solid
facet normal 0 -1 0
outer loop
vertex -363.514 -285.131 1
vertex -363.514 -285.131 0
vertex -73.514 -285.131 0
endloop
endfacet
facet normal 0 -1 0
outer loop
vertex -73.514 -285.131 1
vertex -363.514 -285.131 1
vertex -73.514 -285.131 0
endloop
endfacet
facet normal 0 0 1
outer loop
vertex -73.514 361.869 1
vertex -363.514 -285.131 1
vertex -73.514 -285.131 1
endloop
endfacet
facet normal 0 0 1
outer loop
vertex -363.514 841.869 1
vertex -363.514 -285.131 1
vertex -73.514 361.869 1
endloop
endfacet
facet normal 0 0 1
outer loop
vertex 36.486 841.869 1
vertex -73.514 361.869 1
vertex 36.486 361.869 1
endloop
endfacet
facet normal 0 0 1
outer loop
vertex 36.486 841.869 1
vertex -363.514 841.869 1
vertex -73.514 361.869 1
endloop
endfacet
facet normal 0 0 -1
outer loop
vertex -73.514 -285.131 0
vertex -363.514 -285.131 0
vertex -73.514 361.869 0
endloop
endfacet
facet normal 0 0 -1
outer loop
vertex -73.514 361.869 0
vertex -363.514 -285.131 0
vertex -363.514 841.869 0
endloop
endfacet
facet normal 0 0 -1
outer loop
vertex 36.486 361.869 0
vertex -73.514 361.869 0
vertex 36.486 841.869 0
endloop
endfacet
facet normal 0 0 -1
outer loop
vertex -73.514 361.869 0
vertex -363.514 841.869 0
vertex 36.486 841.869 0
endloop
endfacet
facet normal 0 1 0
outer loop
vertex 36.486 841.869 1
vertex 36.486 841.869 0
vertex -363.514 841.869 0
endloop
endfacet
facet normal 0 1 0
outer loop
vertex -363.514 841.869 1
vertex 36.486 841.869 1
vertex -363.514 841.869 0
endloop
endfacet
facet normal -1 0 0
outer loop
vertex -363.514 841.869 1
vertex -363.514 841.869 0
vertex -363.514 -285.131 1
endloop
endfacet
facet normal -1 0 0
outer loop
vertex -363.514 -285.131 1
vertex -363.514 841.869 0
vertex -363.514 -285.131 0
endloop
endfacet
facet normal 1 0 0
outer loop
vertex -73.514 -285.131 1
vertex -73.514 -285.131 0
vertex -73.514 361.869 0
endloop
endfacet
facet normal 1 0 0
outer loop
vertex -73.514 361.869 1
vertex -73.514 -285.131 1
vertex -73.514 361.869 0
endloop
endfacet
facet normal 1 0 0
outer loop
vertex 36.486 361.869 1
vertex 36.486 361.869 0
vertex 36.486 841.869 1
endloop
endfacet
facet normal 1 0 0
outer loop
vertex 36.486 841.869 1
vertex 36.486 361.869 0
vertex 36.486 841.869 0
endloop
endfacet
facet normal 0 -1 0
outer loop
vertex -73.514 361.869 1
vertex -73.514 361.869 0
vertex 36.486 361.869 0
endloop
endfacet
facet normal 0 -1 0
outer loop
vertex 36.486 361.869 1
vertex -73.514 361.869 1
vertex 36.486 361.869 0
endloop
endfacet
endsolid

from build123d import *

# Parameters (mm, degrees)
F0_W     = 170
F0_H     = 220
F0_H_2   = 82
F1_DEPTH = 1


with BuildPart() as f1:
    # F0 (on Top) → F1 (new body)
    with BuildSketch(Plane.XY):
        Polygon((36.485837, 841.869394), (-363.514163, 841.869394), (-363.514163, 361.869394), (-193.514163, 361.869394), (-73.514163, 361.869394), (36.485837, 361.869394), align=None)
        with Locations((-278.514163, 251.869394)):
            Rectangle(F0_W, F0_H)
        Polygon((-73.514163, 361.869394), (-193.514163, 361.869394), (-193.514163, 141.869394), (-193.514163, 59.869394), (-73.514163, 59.869394), align=None)
        with Locations((-278.514163, 100.869394)):
            Rectangle(F0_W, F0_H_2)
        Polygon((-193.514163, 59.869394), (-363.514163, 59.869394), (-363.514163, -285.130606), (-73.514163, -285.130606), (-73.514163, 59.869394), align=None)
    extrude(amount=F1_DEPTH)


solid = f1.part
